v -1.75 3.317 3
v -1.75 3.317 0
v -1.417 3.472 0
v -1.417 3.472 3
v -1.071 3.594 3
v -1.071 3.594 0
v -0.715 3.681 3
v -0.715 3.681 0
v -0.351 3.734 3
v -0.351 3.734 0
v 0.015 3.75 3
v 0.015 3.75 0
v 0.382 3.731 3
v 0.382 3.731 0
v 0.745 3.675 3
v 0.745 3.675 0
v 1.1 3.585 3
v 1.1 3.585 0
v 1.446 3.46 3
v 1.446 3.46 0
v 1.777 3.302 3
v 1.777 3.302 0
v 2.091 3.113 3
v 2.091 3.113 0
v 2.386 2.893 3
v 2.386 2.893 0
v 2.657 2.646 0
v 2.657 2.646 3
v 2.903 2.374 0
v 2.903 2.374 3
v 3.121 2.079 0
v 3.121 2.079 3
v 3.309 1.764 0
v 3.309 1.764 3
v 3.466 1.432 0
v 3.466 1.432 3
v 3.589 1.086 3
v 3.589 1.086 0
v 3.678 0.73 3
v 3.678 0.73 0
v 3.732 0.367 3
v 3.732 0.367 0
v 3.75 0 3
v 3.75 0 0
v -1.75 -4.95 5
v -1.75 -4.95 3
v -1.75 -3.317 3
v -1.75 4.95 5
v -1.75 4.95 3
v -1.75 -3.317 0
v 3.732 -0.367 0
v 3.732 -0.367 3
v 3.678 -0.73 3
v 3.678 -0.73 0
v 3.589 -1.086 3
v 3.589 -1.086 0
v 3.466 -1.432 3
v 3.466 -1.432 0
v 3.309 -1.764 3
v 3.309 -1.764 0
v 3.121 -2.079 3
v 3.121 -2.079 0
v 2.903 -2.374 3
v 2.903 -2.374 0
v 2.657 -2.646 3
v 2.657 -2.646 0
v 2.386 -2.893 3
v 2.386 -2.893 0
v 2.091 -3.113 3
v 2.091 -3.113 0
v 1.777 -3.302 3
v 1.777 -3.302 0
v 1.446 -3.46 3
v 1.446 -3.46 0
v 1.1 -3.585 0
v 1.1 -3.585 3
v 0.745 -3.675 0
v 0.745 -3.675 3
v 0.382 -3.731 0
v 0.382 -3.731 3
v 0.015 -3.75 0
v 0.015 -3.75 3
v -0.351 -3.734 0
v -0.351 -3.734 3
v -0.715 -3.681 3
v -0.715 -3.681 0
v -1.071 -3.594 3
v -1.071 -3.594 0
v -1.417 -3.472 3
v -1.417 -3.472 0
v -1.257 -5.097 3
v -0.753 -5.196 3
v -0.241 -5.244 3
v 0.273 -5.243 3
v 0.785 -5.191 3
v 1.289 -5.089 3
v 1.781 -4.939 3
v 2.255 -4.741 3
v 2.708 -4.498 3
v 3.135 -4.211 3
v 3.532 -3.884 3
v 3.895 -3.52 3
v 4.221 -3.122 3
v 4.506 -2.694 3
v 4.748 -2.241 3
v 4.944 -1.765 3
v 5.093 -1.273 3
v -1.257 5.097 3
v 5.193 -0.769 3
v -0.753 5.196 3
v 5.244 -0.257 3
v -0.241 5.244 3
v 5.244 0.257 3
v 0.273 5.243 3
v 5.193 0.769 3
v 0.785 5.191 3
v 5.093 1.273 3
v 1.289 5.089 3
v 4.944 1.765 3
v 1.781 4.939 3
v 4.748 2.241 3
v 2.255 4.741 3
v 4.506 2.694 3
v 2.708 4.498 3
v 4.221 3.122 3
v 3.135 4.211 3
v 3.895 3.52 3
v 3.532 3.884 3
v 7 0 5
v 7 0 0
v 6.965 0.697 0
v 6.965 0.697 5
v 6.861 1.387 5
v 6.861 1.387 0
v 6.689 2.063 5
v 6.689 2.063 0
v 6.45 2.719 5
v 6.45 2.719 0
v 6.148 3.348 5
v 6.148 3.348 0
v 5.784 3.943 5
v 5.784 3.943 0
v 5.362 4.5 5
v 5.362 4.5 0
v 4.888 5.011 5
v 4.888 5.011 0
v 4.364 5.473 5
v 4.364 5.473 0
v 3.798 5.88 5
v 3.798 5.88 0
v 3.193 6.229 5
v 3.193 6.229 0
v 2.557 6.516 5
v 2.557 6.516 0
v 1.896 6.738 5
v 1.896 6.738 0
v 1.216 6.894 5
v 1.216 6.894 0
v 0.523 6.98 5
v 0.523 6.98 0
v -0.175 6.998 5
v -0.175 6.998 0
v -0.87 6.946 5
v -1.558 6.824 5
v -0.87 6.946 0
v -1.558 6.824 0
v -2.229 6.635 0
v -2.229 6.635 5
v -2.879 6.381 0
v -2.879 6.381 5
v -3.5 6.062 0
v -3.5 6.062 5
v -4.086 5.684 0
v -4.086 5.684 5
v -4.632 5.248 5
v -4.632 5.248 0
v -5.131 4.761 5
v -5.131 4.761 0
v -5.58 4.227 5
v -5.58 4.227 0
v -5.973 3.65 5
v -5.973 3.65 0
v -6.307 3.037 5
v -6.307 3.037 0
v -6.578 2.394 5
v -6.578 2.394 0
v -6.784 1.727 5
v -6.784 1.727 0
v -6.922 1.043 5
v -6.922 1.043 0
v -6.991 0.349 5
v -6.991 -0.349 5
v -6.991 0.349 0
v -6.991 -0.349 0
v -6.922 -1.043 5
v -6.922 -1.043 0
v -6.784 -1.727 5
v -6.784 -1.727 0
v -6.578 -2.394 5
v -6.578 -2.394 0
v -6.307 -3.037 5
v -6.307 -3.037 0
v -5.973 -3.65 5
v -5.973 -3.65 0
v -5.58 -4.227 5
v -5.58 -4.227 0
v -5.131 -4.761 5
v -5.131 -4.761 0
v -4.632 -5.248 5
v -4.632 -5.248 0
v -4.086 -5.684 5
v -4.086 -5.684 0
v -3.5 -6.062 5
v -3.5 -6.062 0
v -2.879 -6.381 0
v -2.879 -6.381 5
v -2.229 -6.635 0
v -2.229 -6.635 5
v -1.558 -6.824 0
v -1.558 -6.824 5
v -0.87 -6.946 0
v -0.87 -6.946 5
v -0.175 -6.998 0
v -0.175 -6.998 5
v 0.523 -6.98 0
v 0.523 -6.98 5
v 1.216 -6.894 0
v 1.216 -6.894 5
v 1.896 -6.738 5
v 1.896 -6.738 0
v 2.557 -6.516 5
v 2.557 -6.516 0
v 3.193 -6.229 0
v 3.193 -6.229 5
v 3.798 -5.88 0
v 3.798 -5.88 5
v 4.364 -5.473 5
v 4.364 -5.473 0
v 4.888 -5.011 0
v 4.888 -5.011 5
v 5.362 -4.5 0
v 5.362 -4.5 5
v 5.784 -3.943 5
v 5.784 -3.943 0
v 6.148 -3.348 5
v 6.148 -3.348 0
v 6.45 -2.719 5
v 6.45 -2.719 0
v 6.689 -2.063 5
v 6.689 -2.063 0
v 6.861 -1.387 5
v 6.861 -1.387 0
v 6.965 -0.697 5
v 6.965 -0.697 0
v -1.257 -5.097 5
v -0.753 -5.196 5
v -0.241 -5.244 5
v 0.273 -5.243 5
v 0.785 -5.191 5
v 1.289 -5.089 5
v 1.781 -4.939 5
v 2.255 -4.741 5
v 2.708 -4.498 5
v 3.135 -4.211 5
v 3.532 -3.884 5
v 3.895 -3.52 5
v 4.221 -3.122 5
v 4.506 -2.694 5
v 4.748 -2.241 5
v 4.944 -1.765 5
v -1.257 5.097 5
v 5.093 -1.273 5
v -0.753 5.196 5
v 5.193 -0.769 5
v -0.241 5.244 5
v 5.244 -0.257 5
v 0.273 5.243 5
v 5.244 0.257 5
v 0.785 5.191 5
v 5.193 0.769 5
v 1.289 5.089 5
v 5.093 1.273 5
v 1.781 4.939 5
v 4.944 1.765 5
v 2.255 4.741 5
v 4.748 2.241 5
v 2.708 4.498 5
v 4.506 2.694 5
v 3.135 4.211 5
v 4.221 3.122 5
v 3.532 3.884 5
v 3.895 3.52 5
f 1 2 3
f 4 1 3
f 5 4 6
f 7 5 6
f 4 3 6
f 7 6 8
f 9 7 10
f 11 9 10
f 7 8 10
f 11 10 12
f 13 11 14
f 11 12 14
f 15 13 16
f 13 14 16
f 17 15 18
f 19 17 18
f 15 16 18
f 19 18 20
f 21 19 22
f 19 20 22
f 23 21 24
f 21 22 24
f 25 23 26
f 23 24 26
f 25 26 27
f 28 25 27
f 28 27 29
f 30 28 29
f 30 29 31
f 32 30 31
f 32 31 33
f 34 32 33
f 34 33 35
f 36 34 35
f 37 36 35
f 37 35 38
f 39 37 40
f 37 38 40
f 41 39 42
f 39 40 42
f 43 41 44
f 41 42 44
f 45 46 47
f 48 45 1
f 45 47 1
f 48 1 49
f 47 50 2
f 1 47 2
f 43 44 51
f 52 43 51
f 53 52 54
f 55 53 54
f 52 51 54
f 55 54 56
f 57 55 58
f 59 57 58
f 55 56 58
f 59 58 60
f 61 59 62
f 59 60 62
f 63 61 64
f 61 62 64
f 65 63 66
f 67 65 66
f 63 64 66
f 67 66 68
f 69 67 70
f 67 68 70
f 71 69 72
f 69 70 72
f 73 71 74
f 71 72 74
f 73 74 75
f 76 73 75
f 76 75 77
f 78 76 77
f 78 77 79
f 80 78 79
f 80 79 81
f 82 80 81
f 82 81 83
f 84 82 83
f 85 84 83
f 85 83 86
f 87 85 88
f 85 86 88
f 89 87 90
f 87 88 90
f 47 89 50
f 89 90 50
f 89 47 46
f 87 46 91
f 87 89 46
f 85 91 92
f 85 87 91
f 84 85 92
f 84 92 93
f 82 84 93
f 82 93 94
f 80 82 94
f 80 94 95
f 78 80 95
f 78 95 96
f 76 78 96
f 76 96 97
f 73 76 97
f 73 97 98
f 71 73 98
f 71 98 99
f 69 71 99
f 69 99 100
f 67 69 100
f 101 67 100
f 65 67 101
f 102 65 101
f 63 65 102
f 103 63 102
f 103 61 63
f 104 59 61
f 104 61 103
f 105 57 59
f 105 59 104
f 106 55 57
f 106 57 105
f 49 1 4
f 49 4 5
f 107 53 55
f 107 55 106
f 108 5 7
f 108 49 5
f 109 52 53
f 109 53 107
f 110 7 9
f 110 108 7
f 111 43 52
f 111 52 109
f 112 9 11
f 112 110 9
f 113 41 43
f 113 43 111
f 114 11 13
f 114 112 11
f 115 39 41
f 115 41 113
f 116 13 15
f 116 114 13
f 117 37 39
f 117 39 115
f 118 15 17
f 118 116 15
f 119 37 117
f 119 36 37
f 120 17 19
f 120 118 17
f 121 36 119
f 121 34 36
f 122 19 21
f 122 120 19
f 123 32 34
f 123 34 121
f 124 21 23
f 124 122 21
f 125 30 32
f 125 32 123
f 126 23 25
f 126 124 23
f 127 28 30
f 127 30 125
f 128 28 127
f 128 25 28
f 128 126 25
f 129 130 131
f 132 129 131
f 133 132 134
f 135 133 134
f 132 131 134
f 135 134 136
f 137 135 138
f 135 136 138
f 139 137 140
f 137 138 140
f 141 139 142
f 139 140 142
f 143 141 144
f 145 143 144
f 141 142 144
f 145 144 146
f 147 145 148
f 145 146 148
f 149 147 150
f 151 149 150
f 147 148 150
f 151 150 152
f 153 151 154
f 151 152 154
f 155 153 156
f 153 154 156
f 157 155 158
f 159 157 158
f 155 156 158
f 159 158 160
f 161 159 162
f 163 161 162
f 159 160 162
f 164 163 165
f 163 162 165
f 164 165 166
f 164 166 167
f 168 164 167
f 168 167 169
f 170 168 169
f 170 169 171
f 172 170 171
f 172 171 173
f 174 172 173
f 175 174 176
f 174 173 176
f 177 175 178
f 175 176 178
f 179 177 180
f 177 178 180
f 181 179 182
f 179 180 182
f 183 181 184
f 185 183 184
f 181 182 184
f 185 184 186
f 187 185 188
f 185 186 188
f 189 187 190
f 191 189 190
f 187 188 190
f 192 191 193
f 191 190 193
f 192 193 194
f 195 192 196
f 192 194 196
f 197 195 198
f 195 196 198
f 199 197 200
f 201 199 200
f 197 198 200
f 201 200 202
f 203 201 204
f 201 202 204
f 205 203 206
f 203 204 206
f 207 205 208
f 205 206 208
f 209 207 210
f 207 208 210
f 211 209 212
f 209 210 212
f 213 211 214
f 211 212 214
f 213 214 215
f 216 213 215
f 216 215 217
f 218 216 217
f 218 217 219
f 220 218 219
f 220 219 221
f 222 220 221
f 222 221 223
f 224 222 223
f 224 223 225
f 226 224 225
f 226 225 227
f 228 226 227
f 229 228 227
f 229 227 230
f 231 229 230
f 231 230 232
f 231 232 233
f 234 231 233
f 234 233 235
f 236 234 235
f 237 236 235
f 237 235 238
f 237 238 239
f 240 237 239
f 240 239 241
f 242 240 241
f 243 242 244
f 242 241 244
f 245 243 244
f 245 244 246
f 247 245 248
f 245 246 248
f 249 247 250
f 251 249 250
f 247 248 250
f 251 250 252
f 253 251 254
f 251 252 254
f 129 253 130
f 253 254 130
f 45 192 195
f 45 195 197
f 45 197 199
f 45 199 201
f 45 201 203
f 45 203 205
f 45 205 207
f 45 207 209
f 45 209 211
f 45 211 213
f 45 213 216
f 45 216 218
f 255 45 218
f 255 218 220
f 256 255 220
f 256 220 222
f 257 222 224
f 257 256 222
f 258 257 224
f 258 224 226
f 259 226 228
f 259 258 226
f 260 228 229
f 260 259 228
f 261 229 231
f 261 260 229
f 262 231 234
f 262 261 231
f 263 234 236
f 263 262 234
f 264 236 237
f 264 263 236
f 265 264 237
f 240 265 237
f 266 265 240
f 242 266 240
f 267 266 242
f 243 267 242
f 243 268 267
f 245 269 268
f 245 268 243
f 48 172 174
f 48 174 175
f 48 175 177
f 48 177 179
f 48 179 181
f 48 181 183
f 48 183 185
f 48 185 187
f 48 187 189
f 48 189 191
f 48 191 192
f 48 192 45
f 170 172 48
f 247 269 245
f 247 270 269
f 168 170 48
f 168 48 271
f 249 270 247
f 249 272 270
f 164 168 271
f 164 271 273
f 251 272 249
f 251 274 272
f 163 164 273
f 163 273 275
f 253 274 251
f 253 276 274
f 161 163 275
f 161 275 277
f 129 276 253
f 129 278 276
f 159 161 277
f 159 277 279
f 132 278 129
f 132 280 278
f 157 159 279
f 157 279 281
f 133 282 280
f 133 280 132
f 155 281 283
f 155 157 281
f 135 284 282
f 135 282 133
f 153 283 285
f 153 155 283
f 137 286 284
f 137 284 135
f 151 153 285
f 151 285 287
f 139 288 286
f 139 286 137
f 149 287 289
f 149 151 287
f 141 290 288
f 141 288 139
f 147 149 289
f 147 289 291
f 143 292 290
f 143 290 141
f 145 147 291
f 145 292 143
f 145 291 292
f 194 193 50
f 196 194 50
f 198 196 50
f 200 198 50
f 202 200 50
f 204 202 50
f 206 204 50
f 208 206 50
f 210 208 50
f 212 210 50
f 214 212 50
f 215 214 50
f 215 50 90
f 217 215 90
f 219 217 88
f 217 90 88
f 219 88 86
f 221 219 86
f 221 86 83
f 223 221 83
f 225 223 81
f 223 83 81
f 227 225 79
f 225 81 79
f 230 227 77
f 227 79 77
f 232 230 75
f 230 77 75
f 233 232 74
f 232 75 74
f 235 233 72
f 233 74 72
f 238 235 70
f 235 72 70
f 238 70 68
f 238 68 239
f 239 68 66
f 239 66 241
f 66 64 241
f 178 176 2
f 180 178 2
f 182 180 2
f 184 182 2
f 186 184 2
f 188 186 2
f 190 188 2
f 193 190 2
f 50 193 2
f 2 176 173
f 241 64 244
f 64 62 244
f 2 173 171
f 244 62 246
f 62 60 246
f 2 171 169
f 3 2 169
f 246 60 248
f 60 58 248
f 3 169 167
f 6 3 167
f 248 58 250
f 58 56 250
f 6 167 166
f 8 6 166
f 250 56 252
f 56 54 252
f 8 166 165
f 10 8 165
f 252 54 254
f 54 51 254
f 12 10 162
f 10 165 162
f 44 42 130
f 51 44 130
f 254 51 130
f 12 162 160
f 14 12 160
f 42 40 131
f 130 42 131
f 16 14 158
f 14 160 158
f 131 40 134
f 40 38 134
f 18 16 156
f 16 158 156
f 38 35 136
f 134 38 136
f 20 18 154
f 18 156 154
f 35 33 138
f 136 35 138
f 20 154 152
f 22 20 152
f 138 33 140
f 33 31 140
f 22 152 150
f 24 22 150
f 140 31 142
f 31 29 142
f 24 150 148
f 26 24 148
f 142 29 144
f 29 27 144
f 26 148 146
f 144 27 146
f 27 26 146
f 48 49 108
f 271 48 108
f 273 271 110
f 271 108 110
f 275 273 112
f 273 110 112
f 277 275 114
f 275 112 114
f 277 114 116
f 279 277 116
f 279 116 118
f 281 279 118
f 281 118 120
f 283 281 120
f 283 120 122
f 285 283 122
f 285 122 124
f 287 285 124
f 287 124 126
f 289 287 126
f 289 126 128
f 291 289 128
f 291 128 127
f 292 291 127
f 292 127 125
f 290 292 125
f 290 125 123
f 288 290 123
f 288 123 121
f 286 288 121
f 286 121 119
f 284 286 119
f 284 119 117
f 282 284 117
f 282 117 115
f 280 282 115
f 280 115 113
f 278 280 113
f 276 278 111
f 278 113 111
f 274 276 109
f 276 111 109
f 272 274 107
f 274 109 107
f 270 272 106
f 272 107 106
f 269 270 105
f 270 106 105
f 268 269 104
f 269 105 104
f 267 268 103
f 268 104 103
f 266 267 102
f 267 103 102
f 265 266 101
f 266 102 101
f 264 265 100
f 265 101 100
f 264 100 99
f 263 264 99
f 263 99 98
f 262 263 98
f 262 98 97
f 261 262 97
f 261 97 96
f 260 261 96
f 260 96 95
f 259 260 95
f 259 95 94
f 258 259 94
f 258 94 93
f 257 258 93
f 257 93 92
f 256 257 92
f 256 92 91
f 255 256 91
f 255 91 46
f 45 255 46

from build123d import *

# Parameters (mm, degrees)
F0_R     = 7
F1_DEPTH = 5
F2_DEPTH = 3


with BuildPart() as f1:
    # F0 (on Top) → F1 (new body)
    with BuildSketch(Plane.XY):
        Circle(F0_R)
        with BuildLine():
            ThreePointArc((-1.75, -4.9497474683), (-5.25, 0), (-1.75, 4.9497474683))
            ThreePointArc((-1.75, 4.9497474683), (3.0310889132, 4.2866070499), (5.25, 0))
            ThreePointArc((5.25, 0), (3.0310889132, -4.2866070499), (-1.75, -4.9497474683))
        make_face(mode=Mode.SUBTRACT)
        with BuildLine():
            ThreePointArc((-1.75, -3.3166247904), (-3.75, 0), (-1.75, 3.3166247904))
            Line((-1.75, 3.3166247904), (-1.75, 4.9497474683))
            ThreePointArc((-1.75, 4.9497474683), (-5.25, 0), (-1.75, -4.9497474683))
            Line((-1.75, -4.9497474683), (-1.75, -3.3166247904))
        make_face()
        with BuildLine():
            Line((-1.75, 0), (-1.75, 3.3166247904))
            ThreePointArc((-1.75, 3.3166247904), (-3.75, 0), (-1.75, -3.3166247904))
            Line((-1.75, -3.3166247904), (-1.75, 0))
        make_face()
    extrude(amount=F1_DEPTH)

    # F0 (on Top) → F2 (join)
    with BuildSketch(Plane.XY):
        with BuildLine():
            ThreePointArc((-1.75, 3.3166247904), (1.9364916731, 3.2113081447), (3.75, 0))
            ThreePointArc((3.75, 0), (1.9364916731, -3.2113081447), (-1.75, -3.3166247904))
            Line((-1.75, -3.3166247904), (-1.75, -4.9497474683))
            ThreePointArc((-1.75, -4.9497474683), (3.0310889132, -4.2866070499), (5.25, 0))
            ThreePointArc((5.25, 0), (3.0310889132, 4.2866070499), (-1.75, 4.9497474683))
            Line((-1.75, 4.9497474683), (-1.75, 3.3166247904))
        make_face()
    extrude(amount=F2_DEPTH)


solid = f1.part
